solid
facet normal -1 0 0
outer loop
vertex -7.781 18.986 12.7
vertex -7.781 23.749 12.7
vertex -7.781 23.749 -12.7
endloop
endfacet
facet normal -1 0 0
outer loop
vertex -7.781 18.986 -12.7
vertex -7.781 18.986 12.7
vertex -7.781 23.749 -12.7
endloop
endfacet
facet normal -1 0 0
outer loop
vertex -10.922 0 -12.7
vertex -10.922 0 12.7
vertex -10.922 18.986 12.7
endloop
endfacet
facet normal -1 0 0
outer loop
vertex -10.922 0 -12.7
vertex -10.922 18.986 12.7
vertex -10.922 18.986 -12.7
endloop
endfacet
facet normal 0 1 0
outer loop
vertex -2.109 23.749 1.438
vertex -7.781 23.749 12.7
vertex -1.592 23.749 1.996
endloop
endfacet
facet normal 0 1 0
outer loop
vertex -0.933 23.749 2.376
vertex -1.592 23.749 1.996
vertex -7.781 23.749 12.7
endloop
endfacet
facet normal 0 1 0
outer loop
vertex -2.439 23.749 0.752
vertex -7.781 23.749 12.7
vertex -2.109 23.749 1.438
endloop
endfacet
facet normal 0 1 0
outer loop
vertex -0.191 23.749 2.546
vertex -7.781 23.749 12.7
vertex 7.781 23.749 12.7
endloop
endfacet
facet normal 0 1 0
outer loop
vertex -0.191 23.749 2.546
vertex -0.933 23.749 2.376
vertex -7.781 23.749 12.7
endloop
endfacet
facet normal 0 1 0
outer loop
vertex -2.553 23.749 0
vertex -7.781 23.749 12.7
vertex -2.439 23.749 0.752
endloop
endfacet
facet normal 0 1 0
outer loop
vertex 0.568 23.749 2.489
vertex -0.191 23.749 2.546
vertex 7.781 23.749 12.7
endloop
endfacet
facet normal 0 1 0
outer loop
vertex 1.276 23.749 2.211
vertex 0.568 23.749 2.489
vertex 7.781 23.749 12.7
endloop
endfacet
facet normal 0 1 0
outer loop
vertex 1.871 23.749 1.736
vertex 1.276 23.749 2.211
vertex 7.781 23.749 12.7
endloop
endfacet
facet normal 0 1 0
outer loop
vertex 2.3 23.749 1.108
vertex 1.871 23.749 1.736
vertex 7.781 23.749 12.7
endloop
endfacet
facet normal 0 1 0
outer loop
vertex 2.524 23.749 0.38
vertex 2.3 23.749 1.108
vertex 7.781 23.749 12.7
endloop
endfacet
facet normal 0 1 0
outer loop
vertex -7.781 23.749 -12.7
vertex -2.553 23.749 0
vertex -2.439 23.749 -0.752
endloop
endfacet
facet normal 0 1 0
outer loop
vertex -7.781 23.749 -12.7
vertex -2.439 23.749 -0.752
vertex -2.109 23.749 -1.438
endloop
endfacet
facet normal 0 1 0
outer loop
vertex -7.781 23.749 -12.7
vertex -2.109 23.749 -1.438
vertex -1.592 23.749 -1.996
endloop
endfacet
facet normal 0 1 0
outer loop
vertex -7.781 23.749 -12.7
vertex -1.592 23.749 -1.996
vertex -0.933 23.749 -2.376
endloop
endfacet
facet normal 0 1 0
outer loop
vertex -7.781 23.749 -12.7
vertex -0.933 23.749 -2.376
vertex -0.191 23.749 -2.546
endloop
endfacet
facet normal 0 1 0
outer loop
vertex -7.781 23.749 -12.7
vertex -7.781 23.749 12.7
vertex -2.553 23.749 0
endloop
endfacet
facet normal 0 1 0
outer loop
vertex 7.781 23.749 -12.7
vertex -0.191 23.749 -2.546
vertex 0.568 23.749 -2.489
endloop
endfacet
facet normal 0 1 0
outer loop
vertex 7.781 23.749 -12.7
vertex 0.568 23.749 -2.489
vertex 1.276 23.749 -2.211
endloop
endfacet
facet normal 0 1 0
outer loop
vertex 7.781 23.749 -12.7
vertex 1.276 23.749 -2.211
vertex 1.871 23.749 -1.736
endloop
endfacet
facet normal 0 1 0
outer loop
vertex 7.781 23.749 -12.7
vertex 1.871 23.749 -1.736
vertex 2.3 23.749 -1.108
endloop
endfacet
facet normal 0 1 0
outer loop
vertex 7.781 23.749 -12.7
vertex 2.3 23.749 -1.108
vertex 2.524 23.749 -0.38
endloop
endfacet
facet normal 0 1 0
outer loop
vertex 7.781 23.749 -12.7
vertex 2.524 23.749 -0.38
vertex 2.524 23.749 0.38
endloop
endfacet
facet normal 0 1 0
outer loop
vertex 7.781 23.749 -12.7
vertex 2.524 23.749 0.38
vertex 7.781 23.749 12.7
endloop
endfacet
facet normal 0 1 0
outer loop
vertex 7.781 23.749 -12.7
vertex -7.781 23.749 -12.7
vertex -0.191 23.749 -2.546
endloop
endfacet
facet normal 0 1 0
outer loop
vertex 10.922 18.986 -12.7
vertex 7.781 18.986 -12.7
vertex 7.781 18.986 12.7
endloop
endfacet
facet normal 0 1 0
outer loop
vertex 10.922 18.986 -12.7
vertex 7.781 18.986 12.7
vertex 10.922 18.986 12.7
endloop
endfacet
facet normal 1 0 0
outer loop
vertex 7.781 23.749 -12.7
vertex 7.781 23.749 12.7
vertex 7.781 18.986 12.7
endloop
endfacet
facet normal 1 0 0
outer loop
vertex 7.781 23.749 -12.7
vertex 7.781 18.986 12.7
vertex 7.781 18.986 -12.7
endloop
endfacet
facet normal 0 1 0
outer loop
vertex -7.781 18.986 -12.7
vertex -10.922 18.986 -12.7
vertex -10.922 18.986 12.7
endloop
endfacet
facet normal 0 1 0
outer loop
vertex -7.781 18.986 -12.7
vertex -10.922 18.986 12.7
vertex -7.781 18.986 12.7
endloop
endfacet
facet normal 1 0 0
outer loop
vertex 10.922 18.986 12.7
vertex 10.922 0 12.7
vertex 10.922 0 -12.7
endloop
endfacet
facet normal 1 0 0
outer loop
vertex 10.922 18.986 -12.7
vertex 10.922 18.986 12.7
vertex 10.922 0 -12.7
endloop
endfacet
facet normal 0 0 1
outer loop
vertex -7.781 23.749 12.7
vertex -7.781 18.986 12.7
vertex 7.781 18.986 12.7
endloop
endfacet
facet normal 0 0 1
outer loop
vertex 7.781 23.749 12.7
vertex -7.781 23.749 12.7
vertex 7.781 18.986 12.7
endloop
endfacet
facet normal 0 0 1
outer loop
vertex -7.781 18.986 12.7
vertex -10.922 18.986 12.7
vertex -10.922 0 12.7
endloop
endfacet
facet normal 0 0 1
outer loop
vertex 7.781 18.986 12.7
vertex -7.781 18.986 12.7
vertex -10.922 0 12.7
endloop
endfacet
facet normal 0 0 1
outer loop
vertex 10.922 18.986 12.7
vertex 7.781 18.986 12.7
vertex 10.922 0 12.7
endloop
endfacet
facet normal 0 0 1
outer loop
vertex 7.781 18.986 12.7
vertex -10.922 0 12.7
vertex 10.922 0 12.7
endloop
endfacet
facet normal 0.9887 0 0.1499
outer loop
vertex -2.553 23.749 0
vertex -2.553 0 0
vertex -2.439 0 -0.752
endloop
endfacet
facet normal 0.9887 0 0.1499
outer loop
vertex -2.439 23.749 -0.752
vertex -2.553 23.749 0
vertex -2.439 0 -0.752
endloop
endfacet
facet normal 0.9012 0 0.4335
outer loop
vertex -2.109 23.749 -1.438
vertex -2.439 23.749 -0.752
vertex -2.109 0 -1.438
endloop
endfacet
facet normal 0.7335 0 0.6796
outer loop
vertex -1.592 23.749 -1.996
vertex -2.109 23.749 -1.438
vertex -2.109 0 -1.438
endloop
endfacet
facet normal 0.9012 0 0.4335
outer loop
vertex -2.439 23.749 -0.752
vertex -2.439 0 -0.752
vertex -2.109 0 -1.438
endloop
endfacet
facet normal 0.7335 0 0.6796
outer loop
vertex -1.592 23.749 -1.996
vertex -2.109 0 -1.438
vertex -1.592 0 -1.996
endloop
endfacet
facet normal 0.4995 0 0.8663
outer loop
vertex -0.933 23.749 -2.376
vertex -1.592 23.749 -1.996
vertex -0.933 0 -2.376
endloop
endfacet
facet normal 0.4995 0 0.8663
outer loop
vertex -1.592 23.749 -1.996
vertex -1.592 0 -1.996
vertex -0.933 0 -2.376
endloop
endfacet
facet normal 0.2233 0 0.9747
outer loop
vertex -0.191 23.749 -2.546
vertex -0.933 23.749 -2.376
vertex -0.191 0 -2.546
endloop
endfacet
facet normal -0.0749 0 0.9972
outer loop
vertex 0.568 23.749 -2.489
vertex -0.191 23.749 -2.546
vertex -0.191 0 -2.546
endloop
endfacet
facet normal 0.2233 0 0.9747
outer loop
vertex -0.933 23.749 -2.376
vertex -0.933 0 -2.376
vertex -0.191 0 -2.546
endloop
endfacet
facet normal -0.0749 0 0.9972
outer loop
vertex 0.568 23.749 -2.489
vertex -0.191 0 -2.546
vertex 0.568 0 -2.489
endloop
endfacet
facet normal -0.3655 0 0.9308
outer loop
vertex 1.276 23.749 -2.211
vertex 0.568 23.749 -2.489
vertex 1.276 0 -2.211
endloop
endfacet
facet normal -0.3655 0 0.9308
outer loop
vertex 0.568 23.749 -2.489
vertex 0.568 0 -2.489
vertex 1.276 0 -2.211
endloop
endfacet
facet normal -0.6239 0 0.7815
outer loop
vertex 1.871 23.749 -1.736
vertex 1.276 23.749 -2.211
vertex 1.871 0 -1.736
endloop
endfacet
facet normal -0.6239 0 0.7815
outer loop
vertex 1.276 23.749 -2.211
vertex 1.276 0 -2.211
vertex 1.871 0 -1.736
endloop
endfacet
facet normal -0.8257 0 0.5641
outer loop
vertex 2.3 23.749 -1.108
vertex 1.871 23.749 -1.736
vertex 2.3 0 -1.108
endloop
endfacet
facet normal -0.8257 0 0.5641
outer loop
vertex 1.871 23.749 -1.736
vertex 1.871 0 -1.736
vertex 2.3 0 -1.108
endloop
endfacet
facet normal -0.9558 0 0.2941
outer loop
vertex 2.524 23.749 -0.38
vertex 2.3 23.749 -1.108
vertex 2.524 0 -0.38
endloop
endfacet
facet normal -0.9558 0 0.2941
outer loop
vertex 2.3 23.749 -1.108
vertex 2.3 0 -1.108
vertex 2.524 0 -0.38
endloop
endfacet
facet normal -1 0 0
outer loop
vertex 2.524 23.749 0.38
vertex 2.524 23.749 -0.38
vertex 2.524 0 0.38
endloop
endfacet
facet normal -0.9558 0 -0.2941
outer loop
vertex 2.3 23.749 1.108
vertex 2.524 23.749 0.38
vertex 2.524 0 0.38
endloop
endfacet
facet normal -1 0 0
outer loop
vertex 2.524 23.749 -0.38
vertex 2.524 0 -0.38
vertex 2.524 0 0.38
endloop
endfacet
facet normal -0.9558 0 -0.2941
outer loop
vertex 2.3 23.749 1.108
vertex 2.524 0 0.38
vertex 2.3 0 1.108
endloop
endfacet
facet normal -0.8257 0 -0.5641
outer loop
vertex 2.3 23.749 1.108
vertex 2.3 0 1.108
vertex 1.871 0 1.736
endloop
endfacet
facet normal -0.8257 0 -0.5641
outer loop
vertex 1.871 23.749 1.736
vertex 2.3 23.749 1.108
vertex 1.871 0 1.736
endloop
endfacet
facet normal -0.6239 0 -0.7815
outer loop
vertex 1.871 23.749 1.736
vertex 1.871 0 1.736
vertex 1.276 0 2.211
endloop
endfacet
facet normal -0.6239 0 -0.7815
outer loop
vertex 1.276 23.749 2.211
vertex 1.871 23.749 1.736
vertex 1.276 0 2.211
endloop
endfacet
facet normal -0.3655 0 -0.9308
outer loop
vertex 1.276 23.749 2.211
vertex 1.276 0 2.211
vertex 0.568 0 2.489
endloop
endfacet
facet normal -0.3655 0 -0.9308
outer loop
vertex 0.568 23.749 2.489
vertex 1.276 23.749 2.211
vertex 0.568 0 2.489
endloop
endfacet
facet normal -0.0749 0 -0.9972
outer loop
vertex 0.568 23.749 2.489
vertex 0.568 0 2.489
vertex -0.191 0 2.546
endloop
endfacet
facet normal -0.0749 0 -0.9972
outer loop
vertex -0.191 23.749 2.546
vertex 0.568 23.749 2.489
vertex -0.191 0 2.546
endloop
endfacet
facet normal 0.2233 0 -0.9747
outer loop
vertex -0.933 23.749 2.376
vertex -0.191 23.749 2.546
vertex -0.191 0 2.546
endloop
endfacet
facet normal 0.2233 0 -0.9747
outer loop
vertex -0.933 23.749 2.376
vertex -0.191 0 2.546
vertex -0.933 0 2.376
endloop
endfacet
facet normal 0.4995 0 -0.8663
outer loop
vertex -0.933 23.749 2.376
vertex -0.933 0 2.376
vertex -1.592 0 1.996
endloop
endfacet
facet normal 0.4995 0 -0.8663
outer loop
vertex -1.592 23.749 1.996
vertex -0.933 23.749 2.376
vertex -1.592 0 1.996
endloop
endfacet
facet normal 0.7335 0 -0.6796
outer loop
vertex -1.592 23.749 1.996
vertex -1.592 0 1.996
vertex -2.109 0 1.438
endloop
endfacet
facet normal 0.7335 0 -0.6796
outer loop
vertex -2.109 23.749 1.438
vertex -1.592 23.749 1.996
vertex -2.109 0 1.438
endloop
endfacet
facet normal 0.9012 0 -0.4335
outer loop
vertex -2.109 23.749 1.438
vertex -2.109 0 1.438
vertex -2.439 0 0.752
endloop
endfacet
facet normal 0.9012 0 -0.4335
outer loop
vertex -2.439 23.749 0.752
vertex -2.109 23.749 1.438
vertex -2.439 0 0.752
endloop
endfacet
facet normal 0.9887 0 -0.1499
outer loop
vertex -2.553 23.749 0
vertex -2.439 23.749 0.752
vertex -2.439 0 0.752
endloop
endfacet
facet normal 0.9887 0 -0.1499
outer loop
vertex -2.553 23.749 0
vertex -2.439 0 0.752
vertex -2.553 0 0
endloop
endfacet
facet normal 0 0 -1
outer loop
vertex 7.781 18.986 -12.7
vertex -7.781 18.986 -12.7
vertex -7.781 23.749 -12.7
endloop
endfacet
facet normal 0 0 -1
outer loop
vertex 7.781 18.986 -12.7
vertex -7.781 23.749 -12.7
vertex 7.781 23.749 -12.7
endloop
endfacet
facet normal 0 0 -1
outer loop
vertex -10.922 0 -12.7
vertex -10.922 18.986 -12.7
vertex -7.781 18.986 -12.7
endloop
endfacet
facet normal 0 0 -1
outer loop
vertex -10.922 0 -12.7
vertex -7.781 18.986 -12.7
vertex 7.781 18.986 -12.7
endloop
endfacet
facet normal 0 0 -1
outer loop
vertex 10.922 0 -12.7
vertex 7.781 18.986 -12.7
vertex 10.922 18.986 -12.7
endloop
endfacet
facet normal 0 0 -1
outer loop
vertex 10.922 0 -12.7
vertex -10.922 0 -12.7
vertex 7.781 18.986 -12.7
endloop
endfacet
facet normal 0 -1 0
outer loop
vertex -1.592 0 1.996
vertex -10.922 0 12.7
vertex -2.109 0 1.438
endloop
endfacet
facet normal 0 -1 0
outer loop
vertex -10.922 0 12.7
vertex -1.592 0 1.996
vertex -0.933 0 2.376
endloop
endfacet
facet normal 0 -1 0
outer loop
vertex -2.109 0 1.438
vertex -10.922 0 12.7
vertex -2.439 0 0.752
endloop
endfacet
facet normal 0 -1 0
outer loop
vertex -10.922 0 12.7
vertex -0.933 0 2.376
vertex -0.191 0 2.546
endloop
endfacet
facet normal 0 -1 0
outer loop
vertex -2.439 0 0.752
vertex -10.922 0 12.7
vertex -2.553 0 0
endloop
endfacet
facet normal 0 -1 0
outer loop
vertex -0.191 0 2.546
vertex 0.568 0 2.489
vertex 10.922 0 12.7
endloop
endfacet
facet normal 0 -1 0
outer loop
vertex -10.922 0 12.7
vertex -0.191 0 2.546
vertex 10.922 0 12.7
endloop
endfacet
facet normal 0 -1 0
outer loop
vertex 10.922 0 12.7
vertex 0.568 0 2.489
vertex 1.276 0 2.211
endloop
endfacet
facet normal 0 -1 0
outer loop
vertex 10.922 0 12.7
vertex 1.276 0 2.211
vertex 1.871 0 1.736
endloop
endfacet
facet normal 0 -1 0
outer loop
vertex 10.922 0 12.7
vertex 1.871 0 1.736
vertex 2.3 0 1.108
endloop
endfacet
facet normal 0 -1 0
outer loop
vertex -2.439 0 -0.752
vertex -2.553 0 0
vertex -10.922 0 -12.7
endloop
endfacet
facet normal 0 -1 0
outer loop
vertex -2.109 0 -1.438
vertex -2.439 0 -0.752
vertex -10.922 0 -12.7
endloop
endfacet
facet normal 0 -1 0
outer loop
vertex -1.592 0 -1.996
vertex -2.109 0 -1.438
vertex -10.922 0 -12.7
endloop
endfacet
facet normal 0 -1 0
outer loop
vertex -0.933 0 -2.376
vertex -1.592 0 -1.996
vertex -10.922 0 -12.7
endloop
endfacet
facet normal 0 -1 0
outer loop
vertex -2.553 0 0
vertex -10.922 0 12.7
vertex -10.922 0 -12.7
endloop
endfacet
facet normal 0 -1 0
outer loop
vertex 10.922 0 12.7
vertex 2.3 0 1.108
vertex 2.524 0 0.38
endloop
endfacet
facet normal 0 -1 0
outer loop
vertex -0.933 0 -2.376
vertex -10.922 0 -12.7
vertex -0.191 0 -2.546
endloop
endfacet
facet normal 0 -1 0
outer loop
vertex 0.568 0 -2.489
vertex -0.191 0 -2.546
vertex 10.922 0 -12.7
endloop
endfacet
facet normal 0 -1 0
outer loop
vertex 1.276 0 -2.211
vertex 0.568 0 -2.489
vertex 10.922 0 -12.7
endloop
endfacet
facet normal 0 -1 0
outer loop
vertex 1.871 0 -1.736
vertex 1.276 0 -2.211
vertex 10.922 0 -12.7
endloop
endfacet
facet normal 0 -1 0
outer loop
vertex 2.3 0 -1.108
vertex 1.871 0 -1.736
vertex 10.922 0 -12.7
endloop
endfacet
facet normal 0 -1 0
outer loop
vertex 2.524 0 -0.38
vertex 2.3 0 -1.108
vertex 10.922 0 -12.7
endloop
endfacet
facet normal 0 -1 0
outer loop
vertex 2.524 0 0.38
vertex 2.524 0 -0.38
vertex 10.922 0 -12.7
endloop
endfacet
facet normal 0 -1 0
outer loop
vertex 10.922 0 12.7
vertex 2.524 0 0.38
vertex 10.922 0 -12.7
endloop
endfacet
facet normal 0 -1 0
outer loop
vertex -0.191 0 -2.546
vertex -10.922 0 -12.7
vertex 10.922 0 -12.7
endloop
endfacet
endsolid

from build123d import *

# Parameters (mm, degrees)
SKETCH1_W                          = 21.844
SKETCH1_H                          = 25.4
BOSS_EXTRUDE1_DEPTH                = 23.749
CLEARANCE_HOLE_FOR_ALIGNMENT_PIN_D = 5.1054
SKETCH6_W                          = 3.140911286
SKETCH6_H                          = 25.4
CLEARANCE_RABBIT_DEPTH             = 4.7625


with BuildPart() as part:
    # Sketch1 → Boss-Extrude1 (new body)
    with BuildSketch(Plane(origin=(0, 0, 0), x_dir=(1, 0, 0), z_dir=(0, 1, 0))):
        Rectangle(SKETCH1_W, SKETCH1_H)
    extrude(amount=BOSS_EXTRUDE1_DEPTH)

    # Clearance Hole for Alignment Pin (through all)
    with Locations(Plane(origin=(0, 23.749, 0), x_dir=(1, 0, 0), z_dir=(0, 1, 0))):
        with Locations((0, 0)):
            Hole(CLEARANCE_HOLE_FOR_ALIGNMENT_PIN_D / 2)

    # Sketch6 → Clearance Rabbit (cut)
    with BuildSketch(Plane(origin=(0, 23.749, 0), x_dir=(1, 0, 0), z_dir=(0, 1, 0))):
        with Locations((9.351544357, 0)):
            Rectangle(SKETCH6_W, SKETCH6_H)
        with Locations((-9.351544357, 0)):
            Rectangle(SKETCH6_W, SKETCH6_H)
    extrude(amount=-CLEARANCE_RABBIT_DEPTH, mode=Mode.SUBTRACT)


solid = part.part
